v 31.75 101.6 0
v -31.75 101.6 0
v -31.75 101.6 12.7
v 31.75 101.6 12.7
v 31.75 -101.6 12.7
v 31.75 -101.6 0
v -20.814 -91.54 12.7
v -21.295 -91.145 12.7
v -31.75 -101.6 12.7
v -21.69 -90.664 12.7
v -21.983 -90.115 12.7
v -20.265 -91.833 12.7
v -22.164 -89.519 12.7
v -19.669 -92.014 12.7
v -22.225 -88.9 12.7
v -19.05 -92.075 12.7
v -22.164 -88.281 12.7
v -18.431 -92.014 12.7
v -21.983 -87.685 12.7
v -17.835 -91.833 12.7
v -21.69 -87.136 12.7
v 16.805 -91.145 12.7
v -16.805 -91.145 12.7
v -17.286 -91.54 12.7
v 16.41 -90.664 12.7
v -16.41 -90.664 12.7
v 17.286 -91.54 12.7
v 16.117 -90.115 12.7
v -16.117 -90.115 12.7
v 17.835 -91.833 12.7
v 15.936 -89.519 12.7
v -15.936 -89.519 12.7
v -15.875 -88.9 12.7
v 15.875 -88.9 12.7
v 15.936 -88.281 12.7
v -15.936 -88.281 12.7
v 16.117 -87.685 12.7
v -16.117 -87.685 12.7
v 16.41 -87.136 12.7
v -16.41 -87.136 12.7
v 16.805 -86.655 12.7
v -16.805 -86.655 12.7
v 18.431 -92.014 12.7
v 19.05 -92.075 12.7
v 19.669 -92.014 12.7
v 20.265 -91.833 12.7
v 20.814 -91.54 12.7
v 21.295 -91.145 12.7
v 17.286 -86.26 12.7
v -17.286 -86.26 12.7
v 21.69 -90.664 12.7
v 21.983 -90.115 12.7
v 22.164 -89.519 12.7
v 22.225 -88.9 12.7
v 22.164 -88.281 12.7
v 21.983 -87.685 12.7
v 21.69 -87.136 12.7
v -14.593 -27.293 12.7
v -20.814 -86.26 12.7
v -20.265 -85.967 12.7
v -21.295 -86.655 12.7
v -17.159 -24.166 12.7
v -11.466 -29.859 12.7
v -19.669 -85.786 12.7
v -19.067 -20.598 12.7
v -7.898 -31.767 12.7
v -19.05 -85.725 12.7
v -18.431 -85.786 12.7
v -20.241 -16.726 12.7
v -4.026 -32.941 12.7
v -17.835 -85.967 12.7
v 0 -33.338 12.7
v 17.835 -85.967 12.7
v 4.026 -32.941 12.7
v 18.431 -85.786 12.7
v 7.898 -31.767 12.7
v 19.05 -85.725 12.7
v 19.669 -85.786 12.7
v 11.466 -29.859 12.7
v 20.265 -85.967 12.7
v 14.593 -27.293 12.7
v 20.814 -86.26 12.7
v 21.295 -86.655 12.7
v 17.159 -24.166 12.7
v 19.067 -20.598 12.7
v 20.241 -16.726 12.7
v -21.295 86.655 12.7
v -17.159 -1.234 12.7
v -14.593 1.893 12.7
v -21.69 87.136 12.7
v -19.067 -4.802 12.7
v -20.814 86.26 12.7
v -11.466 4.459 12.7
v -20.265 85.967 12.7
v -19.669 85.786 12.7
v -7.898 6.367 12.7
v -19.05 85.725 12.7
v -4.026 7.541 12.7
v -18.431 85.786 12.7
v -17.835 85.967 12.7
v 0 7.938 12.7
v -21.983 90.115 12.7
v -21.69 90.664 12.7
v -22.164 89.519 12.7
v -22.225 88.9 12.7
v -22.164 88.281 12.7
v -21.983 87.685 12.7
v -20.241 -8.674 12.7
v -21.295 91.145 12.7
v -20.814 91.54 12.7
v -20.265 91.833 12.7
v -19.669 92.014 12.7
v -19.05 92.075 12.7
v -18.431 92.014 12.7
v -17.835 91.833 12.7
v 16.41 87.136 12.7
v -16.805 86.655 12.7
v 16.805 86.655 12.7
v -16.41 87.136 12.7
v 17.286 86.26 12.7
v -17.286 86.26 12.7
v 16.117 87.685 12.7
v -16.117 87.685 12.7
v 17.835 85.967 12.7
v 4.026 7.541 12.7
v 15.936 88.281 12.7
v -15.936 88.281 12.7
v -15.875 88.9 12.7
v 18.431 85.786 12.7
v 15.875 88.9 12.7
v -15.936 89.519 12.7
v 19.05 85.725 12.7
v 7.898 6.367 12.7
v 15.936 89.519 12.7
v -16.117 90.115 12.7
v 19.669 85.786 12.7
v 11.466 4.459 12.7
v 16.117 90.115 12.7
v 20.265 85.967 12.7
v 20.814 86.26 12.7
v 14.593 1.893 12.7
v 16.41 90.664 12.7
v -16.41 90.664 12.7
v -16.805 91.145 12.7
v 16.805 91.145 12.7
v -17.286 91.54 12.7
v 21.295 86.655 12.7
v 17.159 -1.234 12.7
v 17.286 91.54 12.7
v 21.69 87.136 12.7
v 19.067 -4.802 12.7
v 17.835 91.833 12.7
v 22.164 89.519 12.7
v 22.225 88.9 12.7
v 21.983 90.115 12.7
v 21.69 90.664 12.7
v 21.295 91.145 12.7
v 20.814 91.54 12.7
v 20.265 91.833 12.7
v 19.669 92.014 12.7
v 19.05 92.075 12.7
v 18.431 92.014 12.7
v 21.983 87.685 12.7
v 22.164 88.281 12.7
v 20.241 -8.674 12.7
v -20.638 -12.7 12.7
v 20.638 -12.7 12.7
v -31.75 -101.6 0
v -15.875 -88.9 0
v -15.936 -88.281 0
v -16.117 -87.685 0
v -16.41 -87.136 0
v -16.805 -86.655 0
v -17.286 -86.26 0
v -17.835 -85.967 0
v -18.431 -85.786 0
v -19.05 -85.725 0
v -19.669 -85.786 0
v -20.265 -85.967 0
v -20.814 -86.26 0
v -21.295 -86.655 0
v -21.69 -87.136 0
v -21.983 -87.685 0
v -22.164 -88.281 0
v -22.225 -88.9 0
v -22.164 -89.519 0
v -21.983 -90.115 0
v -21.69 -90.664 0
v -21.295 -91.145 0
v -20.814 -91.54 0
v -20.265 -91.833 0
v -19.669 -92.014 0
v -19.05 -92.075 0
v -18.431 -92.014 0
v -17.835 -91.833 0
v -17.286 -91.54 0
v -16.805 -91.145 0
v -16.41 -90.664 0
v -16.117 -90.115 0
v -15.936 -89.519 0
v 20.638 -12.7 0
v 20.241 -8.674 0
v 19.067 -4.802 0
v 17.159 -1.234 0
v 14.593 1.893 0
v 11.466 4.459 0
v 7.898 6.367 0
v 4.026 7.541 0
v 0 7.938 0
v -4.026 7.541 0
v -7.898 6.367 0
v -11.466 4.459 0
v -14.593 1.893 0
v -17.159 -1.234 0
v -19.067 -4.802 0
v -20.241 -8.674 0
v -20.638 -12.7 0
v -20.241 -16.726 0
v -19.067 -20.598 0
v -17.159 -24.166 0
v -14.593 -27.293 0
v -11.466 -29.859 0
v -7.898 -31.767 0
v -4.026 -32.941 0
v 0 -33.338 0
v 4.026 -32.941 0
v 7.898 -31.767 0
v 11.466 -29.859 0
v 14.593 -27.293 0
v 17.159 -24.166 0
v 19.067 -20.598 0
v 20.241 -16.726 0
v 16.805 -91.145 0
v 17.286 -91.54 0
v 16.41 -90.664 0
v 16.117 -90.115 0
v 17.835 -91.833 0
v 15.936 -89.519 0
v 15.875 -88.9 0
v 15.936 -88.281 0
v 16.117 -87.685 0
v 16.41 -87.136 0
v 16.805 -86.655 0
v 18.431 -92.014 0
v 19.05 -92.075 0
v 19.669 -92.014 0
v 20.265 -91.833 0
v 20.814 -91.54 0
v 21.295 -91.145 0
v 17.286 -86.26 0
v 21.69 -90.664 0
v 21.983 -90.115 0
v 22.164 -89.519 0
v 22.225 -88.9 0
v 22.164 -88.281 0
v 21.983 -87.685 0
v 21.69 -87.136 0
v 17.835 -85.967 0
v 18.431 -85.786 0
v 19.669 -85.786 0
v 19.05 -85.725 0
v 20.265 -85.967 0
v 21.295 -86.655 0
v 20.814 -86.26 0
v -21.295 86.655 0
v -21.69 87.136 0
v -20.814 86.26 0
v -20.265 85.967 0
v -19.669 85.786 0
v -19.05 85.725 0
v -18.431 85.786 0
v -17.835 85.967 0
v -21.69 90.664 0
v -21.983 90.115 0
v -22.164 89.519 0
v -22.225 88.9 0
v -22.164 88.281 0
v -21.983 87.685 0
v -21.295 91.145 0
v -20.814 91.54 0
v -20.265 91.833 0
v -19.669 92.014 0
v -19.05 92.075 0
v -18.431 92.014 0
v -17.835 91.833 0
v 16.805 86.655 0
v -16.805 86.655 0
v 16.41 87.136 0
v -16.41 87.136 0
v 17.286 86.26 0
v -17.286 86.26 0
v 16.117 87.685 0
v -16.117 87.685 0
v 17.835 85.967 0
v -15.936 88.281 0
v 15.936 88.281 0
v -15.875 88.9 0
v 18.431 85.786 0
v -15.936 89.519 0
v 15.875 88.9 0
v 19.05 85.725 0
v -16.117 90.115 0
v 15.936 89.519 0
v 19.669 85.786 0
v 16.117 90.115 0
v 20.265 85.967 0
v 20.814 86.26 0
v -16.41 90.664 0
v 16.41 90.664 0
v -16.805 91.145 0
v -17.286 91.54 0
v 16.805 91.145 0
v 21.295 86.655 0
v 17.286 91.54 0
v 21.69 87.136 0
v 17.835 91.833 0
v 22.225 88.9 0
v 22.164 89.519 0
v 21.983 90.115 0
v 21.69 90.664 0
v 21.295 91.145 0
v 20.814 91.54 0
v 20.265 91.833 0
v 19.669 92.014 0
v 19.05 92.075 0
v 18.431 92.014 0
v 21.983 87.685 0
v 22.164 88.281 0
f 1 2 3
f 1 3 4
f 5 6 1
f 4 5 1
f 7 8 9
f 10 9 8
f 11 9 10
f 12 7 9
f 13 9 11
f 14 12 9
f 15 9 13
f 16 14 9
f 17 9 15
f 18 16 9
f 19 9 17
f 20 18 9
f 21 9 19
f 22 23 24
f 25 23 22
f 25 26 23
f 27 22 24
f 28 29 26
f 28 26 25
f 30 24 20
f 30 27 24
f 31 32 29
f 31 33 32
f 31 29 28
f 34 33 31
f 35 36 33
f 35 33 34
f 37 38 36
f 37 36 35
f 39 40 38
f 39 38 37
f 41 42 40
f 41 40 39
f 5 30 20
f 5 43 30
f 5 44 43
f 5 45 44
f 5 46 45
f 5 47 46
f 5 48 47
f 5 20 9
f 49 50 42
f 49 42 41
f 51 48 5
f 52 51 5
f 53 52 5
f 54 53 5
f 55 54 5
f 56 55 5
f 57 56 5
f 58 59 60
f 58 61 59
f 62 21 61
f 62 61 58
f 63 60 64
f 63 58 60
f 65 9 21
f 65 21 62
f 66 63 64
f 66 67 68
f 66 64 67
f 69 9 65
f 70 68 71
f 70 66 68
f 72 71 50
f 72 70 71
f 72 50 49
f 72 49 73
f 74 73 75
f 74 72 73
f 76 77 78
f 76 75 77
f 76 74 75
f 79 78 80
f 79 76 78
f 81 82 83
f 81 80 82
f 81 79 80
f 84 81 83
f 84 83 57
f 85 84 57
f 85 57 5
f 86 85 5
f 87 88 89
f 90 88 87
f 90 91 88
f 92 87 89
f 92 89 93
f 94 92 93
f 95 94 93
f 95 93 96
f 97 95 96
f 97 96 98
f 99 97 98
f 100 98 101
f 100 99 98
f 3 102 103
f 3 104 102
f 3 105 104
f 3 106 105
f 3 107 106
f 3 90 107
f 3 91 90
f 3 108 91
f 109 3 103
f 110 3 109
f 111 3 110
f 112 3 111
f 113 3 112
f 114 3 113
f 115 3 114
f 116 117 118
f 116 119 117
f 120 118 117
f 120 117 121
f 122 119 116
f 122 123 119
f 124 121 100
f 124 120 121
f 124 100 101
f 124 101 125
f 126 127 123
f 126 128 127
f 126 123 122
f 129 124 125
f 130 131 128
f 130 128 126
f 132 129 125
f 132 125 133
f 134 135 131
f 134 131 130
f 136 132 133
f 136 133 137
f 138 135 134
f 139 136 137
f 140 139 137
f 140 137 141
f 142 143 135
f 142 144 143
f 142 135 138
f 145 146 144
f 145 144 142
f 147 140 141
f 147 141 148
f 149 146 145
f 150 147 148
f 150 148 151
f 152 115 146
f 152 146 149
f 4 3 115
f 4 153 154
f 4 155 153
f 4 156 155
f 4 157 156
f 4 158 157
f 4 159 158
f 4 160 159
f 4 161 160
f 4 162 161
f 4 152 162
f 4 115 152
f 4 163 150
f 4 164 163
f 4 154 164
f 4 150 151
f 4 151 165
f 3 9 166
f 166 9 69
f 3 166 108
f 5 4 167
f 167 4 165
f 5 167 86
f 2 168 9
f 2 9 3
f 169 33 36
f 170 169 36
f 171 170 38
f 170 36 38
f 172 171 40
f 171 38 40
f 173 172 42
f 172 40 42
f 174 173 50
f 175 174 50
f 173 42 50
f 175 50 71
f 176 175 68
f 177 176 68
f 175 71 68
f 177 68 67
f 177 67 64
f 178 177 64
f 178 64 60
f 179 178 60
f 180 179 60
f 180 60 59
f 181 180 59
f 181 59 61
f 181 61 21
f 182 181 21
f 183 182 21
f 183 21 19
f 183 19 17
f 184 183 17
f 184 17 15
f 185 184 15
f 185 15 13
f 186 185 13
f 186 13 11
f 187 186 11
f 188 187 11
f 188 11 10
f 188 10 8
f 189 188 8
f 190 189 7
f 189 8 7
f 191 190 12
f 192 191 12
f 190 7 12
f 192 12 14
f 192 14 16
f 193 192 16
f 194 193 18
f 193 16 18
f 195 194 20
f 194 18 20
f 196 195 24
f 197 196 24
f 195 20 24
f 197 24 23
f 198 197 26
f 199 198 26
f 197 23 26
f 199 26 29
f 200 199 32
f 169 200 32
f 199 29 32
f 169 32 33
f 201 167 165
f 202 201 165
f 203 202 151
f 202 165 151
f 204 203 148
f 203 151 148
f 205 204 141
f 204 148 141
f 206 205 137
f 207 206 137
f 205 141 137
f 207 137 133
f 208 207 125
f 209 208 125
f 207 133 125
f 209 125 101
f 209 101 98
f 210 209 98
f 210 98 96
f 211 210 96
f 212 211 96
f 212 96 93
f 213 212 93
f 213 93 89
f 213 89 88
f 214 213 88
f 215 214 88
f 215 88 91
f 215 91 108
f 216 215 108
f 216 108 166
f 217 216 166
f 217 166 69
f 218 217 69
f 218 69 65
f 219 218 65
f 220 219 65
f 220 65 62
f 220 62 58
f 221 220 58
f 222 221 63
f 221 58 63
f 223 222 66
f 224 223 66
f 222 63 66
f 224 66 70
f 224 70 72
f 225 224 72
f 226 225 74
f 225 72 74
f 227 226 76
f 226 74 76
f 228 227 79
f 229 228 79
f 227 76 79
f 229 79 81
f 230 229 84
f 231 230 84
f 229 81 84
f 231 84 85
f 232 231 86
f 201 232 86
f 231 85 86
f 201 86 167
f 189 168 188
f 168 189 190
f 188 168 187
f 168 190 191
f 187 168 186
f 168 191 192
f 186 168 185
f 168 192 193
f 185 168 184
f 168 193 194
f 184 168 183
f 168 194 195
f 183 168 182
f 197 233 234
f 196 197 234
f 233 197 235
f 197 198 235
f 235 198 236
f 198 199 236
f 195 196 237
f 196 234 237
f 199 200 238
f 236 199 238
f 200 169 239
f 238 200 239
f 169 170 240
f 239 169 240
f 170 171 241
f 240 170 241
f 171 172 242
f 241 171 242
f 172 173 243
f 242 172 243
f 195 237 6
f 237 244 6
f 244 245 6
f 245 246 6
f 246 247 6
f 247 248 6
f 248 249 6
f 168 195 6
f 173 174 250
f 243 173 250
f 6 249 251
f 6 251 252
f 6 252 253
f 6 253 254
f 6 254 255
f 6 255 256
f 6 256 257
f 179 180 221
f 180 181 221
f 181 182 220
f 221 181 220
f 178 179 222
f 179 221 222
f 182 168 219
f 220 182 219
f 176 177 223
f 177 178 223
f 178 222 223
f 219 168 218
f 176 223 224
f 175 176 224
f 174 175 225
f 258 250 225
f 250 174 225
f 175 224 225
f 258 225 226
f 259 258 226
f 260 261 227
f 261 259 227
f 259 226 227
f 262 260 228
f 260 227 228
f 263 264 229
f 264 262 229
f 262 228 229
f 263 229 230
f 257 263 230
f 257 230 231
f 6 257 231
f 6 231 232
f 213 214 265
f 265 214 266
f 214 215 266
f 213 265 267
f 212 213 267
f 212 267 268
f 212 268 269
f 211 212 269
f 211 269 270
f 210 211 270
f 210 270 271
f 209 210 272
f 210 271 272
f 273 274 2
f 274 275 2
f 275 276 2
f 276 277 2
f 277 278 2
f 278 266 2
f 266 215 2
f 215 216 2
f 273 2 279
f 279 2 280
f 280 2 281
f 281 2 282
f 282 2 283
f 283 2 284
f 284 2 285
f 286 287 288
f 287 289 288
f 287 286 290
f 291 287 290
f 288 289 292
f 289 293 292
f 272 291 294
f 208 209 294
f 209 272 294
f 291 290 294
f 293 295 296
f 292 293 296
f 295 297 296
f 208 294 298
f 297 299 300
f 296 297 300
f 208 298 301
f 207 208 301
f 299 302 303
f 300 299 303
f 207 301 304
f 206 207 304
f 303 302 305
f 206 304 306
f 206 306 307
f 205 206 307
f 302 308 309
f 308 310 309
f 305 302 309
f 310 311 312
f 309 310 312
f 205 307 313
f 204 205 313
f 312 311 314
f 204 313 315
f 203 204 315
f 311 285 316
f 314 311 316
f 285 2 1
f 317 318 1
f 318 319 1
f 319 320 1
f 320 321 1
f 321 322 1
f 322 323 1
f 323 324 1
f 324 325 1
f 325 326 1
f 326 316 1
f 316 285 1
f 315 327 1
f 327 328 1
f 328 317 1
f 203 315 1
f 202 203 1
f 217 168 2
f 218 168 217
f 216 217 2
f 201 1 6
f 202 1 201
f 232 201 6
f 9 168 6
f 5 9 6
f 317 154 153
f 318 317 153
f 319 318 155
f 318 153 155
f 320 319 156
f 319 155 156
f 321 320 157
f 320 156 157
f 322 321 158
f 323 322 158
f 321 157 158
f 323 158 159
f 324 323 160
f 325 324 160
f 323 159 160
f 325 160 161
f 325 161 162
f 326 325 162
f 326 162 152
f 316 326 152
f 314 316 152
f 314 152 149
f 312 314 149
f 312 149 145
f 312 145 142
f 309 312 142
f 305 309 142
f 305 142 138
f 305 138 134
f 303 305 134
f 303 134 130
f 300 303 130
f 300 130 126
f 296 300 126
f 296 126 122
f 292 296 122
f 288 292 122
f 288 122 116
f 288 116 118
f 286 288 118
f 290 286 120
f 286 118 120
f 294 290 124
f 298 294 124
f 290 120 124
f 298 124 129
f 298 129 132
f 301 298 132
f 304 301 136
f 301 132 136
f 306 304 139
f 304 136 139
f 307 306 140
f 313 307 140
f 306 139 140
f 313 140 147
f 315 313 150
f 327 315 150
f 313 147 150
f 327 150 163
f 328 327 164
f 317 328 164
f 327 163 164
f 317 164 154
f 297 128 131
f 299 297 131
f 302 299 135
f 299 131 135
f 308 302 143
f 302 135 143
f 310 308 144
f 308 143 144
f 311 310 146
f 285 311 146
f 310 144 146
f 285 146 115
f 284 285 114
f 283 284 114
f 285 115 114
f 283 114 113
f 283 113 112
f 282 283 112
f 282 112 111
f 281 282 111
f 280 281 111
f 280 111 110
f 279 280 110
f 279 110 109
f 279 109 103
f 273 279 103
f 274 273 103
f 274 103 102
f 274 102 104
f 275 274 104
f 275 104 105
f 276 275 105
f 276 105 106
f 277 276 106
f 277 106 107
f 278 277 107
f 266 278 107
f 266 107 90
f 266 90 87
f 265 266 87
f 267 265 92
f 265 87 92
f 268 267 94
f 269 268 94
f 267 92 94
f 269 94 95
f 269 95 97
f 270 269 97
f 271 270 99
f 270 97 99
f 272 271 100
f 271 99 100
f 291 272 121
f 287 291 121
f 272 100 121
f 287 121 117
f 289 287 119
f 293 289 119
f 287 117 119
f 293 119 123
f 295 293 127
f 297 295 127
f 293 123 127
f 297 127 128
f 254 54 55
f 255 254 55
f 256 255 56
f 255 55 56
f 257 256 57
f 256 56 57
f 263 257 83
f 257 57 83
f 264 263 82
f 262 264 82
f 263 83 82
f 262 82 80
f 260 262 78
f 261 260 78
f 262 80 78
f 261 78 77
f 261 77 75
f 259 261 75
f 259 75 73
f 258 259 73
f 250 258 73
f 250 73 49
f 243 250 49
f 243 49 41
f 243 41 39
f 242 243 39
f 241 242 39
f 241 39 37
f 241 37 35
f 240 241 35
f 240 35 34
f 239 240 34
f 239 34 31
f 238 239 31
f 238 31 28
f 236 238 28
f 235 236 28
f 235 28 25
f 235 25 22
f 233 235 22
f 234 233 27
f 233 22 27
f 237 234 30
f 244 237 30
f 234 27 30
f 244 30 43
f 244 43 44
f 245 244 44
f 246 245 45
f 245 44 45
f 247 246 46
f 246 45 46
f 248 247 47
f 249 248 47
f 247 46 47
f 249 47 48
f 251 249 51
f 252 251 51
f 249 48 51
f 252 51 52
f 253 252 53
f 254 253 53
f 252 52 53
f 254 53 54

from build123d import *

# Parameters (mm, degrees)
SKETCH1_W            = 63.5
SKETCH1_H            = 203.2
BOSS_EXTRUDE1_DEPTH  = 12.7
SKETCH2_R            = 3.175
CUT_EXTRUDE1_DEPTH   = 108.200338152
LPATTERN1_COUNT      = 2
LPATTERN1_PITCH      = 38.1
LPATTERN1_COUNT_DIR2 = 2
LPATTERN1_PITCH_DIR2 = 177.8
SKETCH3_R            = 20.6375
CUT_EXTRUDE2_DEPTH   = 108.200338152


with BuildPart() as part:
    # Sketch1 → Boss-Extrude1 (new body)
    with BuildSketch(Plane.XY):
        Rectangle(SKETCH1_W, SKETCH1_H)
    extrude(amount=BOSS_EXTRUDE1_DEPTH)

    # Sketch2 → Cut-Extrude1 (cut, through all)
    with BuildSketch(Plane.XY.offset(12.7)):
        with Locations((-19.05, 88.9)):
            Circle(SKETCH2_R)
    cut_extrude1 = extrude(amount=-CUT_EXTRUDE1_DEPTH, mode=Mode.SUBTRACT)

    # LPattern1: Cut-Extrude1 2 × 2
    with Locations(*[(i * LPATTERN1_PITCH, -j * LPATTERN1_PITCH_DIR2, 0) for i in range(LPATTERN1_COUNT) for j in range(LPATTERN1_COUNT_DIR2) if (i, j) != (0, 0)]):
        add(cut_extrude1, mode=Mode.SUBTRACT)

    # Sketch3 → Cut-Extrude2 (cut, through all)
    with BuildSketch(Plane.XY.offset(12.7)):
        with Locations((0, -12.7)):
            Circle(SKETCH3_R)
    extrude(amount=-CUT_EXTRUDE2_DEPTH, mode=Mode.SUBTRACT)


solid = part.part
